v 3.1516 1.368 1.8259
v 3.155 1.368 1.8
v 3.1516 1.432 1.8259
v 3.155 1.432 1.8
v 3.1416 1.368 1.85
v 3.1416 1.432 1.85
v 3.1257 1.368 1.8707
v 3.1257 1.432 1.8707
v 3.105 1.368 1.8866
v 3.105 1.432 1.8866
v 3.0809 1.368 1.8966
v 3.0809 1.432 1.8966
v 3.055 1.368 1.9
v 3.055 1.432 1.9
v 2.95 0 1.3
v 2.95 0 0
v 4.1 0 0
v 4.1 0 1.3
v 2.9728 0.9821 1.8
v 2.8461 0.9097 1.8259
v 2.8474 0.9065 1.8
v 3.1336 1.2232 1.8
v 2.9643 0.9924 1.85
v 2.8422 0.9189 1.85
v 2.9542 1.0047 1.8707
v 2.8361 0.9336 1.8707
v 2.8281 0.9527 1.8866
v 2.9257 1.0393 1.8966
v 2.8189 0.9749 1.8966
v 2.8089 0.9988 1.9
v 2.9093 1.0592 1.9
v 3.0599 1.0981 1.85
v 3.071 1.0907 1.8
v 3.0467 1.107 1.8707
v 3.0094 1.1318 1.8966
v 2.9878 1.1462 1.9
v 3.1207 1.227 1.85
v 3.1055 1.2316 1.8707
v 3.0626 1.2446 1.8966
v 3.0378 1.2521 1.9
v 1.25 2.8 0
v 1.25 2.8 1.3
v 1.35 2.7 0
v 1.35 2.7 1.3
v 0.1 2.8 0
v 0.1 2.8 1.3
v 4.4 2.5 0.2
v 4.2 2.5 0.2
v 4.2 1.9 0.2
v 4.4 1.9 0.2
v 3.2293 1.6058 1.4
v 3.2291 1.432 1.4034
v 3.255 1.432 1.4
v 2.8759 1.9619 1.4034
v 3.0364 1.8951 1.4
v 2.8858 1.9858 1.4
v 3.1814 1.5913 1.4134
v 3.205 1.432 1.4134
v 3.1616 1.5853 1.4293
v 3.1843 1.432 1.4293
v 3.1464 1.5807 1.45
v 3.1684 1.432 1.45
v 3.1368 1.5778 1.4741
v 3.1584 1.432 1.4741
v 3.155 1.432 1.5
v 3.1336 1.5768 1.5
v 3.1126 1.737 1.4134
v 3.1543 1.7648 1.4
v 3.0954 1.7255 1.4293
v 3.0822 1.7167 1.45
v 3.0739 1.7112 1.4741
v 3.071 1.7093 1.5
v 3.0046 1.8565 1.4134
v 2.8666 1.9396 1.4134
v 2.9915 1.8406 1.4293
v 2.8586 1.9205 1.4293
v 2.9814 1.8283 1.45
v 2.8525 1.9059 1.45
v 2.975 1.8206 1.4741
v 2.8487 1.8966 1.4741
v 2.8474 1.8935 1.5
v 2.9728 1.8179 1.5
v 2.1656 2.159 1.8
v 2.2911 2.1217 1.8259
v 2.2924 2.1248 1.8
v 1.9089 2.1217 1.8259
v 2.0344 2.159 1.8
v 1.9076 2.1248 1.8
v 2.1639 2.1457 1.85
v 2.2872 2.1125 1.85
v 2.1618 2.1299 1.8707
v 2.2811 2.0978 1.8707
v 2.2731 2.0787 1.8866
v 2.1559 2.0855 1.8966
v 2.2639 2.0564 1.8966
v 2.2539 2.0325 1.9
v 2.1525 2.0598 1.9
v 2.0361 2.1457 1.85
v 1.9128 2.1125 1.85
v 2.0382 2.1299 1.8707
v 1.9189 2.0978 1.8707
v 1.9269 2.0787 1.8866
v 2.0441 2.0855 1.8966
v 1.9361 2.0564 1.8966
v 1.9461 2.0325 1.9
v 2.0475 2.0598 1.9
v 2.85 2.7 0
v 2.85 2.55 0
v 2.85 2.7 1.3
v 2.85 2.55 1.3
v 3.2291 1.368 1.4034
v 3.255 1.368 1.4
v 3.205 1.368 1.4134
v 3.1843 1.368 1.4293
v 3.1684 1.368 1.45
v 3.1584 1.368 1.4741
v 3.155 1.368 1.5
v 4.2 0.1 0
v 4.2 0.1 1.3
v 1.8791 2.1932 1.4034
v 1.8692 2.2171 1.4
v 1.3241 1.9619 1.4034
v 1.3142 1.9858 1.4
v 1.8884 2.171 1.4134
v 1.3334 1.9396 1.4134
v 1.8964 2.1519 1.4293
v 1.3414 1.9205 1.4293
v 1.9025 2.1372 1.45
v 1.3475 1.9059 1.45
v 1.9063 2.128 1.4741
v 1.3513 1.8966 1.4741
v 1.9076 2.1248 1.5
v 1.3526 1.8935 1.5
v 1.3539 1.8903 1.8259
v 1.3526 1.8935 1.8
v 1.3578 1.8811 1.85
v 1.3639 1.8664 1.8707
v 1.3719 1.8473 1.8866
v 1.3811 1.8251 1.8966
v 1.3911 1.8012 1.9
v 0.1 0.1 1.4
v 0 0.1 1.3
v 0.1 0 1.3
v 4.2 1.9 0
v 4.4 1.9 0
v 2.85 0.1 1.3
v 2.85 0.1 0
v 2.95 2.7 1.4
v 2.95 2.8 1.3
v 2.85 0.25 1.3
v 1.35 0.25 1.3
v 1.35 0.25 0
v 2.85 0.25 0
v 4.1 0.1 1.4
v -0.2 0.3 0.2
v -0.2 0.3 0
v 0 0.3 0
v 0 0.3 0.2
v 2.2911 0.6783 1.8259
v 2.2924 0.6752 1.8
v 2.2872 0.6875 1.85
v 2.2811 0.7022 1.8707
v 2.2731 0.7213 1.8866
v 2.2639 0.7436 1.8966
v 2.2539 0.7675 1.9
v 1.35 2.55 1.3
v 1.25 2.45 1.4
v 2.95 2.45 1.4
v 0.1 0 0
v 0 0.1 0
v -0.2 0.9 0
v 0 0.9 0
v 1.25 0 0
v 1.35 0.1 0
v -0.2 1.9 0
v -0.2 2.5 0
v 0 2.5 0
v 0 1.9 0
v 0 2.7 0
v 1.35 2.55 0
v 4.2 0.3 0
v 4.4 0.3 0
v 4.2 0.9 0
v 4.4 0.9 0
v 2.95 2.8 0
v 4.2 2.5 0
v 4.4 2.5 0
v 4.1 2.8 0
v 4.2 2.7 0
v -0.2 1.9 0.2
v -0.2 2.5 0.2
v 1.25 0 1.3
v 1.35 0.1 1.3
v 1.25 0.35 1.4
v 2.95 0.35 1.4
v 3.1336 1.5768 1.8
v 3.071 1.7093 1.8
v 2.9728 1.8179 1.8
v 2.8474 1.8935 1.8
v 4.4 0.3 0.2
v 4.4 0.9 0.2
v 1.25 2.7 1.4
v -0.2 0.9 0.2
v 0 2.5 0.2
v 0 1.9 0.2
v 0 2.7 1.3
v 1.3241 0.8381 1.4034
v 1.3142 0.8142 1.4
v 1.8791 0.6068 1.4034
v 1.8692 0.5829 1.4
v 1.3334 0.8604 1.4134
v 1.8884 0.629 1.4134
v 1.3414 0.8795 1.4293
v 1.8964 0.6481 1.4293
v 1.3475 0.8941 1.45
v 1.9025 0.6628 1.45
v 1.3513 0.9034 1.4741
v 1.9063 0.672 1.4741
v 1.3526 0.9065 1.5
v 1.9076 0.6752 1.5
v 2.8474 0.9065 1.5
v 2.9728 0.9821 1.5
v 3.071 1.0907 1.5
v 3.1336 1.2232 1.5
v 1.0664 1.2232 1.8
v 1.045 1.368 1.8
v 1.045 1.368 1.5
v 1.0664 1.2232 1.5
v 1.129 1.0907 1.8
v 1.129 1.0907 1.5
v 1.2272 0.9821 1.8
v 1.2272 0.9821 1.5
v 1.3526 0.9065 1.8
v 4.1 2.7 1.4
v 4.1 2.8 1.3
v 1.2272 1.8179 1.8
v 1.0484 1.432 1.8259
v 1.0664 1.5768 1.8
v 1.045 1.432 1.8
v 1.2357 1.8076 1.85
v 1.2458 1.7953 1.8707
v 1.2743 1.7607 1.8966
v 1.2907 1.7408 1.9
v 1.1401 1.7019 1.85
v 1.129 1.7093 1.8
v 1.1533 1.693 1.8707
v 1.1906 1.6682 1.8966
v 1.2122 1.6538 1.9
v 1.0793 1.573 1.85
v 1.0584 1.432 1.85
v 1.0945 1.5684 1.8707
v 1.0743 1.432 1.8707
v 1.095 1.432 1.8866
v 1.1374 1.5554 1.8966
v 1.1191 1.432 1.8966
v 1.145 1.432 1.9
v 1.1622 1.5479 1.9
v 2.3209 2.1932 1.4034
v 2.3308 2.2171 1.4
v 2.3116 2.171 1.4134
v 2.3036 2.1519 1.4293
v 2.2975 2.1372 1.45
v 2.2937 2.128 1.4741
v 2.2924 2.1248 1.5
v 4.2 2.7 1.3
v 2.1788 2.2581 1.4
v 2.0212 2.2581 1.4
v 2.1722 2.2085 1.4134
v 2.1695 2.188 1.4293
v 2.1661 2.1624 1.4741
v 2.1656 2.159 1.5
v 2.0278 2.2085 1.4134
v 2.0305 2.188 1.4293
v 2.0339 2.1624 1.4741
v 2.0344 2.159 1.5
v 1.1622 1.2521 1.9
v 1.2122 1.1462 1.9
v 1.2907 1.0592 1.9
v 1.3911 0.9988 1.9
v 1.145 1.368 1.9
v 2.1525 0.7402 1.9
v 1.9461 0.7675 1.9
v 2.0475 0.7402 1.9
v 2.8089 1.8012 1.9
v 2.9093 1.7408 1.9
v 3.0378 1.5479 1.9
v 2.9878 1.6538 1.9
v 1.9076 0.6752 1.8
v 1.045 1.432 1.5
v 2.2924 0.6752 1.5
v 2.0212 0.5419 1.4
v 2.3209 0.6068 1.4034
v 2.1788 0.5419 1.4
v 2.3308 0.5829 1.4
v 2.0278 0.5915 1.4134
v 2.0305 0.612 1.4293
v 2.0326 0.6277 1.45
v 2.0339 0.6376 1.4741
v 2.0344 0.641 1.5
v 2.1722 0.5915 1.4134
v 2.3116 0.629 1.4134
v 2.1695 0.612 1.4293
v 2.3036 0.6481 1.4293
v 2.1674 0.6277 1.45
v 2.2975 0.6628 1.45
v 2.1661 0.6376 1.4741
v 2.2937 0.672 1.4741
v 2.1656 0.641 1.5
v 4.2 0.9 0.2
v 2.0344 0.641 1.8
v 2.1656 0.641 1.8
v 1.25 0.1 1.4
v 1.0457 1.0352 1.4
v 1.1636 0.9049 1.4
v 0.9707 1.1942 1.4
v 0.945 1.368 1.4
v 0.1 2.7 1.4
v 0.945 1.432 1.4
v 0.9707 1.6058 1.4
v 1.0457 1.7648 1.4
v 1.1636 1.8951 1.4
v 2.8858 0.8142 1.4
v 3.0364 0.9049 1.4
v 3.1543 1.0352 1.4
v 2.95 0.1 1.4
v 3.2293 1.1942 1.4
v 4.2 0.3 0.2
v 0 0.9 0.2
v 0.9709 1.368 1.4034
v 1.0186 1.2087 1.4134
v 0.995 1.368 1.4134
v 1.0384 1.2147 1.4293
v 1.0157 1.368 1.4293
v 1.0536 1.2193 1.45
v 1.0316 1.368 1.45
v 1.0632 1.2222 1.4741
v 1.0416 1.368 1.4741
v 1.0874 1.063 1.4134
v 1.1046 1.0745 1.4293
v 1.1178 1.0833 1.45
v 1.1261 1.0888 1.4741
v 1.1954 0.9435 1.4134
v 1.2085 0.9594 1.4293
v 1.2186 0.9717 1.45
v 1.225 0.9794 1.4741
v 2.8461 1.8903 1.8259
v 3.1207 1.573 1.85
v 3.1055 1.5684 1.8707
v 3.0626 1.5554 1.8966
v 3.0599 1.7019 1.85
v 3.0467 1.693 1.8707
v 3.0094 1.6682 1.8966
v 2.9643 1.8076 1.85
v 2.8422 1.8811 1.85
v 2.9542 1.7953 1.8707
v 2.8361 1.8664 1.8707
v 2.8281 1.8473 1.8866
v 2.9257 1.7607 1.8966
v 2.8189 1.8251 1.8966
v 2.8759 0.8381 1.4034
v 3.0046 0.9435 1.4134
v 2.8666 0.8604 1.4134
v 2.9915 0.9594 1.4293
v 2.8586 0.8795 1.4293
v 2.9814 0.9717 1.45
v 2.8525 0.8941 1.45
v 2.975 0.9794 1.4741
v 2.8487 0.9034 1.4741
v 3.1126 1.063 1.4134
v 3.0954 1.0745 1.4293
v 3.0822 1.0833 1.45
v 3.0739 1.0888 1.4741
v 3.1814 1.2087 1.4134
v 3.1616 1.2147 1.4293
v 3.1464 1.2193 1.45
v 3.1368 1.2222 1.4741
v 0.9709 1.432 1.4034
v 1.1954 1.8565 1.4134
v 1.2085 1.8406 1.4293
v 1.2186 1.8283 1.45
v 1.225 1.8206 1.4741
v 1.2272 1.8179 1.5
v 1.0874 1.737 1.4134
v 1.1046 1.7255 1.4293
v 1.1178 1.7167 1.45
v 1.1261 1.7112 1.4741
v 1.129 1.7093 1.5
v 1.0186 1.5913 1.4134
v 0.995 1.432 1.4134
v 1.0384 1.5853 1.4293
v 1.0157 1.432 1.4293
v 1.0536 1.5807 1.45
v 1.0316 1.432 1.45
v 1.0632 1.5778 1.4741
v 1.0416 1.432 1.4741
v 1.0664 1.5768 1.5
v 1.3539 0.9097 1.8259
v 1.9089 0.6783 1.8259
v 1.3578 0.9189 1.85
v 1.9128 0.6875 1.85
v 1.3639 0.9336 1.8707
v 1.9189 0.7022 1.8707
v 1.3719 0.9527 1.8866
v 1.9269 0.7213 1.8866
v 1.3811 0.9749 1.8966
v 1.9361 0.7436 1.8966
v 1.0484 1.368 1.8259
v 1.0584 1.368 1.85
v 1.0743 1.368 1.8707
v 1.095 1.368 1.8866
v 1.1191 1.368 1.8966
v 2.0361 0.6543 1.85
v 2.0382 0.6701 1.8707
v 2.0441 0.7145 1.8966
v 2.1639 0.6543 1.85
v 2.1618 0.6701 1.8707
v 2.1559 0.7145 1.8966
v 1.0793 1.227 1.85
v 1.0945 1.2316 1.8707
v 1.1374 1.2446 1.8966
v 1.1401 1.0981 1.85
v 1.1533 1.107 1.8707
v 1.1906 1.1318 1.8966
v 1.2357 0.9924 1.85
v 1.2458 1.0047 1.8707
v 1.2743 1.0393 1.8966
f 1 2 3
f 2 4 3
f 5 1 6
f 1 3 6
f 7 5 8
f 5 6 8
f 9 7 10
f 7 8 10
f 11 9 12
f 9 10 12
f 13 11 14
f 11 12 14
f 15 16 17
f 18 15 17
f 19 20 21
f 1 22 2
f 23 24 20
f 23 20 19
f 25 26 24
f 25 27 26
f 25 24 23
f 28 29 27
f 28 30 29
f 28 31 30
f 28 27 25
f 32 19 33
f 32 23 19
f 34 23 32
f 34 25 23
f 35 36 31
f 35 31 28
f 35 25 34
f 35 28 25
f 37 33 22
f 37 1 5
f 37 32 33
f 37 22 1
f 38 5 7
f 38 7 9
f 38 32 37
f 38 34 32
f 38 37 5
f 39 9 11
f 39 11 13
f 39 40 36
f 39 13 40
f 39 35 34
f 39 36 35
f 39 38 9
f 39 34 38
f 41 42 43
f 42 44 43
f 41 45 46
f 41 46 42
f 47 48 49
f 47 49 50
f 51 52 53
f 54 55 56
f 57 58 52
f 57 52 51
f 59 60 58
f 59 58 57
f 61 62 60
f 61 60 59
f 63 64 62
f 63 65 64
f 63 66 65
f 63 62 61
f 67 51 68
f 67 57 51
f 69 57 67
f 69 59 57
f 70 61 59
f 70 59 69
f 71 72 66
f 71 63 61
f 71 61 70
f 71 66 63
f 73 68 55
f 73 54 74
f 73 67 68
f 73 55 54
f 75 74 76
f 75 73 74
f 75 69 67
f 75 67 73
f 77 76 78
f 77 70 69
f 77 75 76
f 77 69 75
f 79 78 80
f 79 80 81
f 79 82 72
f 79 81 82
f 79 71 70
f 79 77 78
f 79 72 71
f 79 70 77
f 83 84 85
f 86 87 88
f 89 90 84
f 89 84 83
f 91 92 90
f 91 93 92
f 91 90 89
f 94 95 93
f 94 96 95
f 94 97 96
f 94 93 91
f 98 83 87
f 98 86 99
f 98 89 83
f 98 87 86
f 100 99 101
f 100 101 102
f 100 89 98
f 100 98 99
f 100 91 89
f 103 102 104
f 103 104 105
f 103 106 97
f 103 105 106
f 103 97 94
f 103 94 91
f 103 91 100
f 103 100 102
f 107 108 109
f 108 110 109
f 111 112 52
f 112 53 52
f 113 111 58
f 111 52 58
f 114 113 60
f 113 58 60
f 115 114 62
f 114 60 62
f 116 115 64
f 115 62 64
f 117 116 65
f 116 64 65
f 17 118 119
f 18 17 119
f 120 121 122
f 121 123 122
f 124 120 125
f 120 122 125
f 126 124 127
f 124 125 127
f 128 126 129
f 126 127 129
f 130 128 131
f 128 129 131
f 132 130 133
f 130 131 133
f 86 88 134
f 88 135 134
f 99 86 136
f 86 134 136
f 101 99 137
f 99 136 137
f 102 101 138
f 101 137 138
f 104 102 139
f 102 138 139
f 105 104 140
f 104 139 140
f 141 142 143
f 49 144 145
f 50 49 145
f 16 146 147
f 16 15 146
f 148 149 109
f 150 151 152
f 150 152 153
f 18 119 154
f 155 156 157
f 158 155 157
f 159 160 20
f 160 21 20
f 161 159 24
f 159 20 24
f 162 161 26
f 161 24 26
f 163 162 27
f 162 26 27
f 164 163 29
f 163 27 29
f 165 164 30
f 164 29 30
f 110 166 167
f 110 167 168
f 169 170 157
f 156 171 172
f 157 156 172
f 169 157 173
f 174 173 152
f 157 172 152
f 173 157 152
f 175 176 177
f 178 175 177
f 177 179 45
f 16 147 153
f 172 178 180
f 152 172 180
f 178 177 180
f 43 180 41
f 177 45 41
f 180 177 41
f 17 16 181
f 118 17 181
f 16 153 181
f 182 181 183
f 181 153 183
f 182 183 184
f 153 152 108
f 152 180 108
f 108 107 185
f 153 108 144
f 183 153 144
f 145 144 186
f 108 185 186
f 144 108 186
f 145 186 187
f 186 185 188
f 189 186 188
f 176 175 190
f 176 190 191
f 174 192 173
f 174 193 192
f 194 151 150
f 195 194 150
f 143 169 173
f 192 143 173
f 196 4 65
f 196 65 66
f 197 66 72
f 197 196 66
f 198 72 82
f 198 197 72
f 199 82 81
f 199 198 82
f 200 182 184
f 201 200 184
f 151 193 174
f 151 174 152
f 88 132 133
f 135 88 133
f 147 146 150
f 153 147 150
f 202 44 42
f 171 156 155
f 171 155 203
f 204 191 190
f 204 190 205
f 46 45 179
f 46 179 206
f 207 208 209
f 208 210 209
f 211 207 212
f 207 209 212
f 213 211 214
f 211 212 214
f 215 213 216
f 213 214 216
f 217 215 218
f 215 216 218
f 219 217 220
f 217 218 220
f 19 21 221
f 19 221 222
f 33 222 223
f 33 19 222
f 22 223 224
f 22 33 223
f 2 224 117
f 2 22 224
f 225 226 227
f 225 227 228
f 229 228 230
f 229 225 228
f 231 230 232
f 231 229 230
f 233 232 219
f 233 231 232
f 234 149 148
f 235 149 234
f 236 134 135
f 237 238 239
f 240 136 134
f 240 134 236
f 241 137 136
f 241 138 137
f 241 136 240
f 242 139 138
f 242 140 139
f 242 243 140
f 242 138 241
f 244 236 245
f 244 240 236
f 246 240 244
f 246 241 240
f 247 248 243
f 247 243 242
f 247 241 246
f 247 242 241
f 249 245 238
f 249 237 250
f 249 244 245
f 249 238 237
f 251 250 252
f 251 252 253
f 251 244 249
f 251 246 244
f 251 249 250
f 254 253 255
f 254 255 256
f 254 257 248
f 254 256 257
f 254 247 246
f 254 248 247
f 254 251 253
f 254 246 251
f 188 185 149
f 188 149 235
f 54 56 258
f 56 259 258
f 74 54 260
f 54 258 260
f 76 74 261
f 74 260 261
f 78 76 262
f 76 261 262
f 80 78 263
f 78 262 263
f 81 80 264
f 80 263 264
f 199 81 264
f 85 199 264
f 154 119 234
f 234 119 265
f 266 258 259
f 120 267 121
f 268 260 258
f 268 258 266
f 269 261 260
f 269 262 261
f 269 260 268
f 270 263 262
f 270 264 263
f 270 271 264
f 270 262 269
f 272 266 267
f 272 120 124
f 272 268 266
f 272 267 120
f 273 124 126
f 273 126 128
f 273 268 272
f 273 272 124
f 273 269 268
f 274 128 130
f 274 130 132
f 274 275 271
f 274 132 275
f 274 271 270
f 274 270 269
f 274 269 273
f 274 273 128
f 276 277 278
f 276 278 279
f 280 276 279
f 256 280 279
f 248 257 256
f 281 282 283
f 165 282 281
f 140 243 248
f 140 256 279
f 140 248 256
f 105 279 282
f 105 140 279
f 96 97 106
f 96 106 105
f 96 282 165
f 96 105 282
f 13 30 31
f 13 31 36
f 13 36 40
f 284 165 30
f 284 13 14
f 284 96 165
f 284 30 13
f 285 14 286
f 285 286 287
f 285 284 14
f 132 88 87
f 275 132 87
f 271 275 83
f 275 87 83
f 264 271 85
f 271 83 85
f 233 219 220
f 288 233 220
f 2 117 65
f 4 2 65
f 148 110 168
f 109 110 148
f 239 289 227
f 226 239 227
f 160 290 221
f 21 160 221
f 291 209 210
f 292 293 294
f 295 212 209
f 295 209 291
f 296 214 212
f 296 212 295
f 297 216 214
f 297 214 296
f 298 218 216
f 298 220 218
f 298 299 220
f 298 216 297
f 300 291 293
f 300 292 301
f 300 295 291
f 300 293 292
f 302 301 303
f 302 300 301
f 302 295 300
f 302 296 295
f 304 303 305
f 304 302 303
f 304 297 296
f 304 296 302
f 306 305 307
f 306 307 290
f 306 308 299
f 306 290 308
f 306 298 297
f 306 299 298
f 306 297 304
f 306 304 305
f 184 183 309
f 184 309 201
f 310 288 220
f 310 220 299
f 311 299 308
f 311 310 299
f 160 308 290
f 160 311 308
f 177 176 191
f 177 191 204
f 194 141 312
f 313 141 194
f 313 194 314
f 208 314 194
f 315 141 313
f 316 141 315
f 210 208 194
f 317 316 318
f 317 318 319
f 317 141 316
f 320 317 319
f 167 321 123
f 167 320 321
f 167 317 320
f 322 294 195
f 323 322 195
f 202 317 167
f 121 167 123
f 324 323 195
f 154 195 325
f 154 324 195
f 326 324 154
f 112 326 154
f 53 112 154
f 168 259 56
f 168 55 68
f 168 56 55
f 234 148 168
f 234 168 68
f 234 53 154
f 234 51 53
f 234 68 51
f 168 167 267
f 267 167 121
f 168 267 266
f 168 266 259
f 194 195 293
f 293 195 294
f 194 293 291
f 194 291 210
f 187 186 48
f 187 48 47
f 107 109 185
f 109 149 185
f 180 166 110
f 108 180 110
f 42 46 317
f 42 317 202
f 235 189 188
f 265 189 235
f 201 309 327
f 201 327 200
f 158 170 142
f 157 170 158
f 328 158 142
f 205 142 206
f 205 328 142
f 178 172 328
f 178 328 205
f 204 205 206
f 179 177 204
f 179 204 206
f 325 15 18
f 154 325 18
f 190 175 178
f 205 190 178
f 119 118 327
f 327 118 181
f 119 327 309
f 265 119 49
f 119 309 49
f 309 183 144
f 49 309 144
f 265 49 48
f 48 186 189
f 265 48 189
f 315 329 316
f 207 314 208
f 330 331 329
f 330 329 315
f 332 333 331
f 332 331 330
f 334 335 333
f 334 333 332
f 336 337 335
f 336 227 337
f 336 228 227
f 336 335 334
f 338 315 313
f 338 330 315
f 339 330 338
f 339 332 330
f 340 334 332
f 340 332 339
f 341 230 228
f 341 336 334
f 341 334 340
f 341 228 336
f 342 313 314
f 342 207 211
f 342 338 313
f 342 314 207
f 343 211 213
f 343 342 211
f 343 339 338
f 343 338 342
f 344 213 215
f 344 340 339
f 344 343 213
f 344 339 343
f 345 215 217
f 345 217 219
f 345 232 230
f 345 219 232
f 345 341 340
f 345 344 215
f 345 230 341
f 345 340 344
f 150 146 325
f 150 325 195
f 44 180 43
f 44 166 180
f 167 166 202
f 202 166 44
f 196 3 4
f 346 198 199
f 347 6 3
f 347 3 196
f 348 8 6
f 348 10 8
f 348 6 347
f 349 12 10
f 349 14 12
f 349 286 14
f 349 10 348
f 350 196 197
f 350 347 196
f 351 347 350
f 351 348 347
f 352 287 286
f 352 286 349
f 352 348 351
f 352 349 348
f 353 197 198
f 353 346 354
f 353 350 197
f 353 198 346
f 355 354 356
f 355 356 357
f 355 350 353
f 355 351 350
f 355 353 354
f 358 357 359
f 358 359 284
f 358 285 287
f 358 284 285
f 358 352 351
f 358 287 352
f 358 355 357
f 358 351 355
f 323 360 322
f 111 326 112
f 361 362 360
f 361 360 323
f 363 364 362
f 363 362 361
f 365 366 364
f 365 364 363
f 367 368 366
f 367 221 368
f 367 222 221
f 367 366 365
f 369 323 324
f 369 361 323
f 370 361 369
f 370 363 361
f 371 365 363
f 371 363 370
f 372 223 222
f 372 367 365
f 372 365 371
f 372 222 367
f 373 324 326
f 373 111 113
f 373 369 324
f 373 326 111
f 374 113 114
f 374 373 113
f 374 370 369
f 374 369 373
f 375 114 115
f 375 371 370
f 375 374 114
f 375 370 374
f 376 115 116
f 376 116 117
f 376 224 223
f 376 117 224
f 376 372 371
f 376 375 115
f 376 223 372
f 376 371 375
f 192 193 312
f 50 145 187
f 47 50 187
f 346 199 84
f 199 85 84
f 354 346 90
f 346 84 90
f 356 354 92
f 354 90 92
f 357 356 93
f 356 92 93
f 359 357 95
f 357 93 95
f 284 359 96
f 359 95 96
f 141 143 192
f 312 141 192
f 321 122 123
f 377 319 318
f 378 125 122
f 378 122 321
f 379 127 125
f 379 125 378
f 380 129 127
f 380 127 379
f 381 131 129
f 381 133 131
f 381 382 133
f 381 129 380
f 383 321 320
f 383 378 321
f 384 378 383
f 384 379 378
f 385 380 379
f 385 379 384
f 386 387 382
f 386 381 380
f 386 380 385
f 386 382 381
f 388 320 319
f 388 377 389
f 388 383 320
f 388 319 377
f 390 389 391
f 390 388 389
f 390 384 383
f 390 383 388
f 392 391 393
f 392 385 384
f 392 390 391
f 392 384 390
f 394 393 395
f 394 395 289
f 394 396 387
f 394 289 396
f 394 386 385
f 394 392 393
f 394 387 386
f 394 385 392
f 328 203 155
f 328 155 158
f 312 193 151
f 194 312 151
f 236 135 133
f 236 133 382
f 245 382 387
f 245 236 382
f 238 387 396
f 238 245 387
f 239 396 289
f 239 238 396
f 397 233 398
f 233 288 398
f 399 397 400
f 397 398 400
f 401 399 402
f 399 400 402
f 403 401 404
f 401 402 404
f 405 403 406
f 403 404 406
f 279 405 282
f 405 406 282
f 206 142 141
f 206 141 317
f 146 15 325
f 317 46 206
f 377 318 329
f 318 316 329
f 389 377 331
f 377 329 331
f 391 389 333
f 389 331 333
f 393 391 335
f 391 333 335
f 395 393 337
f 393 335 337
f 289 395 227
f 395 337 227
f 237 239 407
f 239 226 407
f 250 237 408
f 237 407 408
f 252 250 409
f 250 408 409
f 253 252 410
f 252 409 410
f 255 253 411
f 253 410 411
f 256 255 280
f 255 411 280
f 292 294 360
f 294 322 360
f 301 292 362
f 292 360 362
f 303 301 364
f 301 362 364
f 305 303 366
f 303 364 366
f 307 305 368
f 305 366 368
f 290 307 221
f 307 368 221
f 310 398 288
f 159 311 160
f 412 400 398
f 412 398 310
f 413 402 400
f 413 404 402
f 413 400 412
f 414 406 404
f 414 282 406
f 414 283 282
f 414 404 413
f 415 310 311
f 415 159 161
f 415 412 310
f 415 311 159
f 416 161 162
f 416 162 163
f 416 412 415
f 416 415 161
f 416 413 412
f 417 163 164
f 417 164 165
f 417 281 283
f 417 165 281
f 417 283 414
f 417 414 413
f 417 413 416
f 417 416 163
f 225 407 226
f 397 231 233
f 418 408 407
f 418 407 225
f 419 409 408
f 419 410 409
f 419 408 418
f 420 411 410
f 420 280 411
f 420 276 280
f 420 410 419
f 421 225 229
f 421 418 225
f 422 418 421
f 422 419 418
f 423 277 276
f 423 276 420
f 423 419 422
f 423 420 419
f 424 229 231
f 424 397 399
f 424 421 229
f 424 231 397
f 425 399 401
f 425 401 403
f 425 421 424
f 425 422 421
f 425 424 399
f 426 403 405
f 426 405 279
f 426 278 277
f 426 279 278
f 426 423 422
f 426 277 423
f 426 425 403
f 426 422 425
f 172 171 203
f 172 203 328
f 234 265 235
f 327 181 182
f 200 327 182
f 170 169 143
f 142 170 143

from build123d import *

# Parameters (mm, degrees)
SKETCH1_W           = 4.2
SKETCH1_H           = 2.8
BOSS_EXTRUDE1_DEPTH = 1.4
SKETCH2_W           = 0.2
SKETCH2_H           = 0.6
BOSS_EXTRUDE2_DEPTH = 0.2
SKETCH3_W           = 1.5
SKETCH3_H           = 0.25
CUT_EXTRUDE1_DEPTH  = 2.4
BOSS_EXTRUDE3_DEPTH = 0.5
FILLET1_R           = 0.5
FILLET2_R           = 0.1
CHAMFER1_SIZE       = 0.1


with BuildPart() as part:
    # Sketch1 → Boss-Extrude1 (new body)
    with BuildSketch(Plane.XY):
        with Locations((2.1, 1.4)):
            Rectangle(SKETCH1_W, SKETCH1_H)
    extrude(amount=BOSS_EXTRUDE1_DEPTH)

    # Sketch2 → Boss-Extrude2 (add)
    with BuildSketch(Plane.XY):
        with Locations((4.3, 2.2)):
            Rectangle(SKETCH2_W, SKETCH2_H)
        with Locations((4.3, 0.6)):
            Rectangle(SKETCH2_W, SKETCH2_H)
        with Locations((-0.1, 2.2)):
            Rectangle(SKETCH2_W, SKETCH2_H)
        with Locations((-0.1, 0.6)):
            Rectangle(SKETCH2_W, SKETCH2_H)
    extrude(amount=BOSS_EXTRUDE2_DEPTH)

    # Sketch3 → Cut-Extrude1 (cut, through all)
    with BuildSketch(Plane.XY.offset(1.4)):
        with Locations((2.1, 2.675)):
            Rectangle(SKETCH3_W, SKETCH3_H)
        with Locations((2.1, 0.125)):
            Rectangle(SKETCH3_W, SKETCH3_H)
    extrude(amount=-CUT_EXTRUDE1_DEPTH, mode=Mode.SUBTRACT)

    # Sketch4 → Boss-Extrude3 (add)
    with BuildSketch(Plane.XY.offset(1.4)):
        Polygon((2.1, 2.205), (1.045, 1.765257339), (1.045, 1.034742661), (2.1, 0.595), (3.155, 1.034742661), (3.155, 1.765257339), align=None)
    extrude(amount=BOSS_EXTRUDE3_DEPTH)

    # Fillet1
    fillet1_edges = [part.edges().sort_by_distance(p)[0] for p in [
        (3.155, 1.765257339, 1.65),
        (2.1, 2.205, 1.65),
        (1.045, 1.765257339, 1.65),
        (1.045, 1.034742661, 1.65),
        (2.1, 0.595, 1.65),
        (3.155, 1.034742661, 1.65),
    ]]
    fillet(fillet1_edges, radius=FILLET1_R)

    # Fillet2
    fillet2_edges = [part.edges().sort_by_distance(p)[0] for p in [
        (1.630132921, 2.00915109, 1.4),
        (1.630132921, 2.00915109, 1.9),
        (2.569867079, 2.00915109, 1.4),
        (2.569867079, 2.00915109, 1.9),
        (1.045, 1.4, 1.9),
        (1.630132921, 0.79084891, 1.9),
        (2.569867079, 0.79084891, 1.9),
        (3.155, 1.4, 1.9),
        (2.1, 0.636695714, 1.9),
        (1.12895701, 1.090706199, 1.9),
        (3.07104299, 1.090706199, 1.9),
        (3.07104299, 1.709293801, 1.9),
        (1.12895701, 1.709293801, 1.9),
        (2.1, 2.163304286, 1.9),
        (1.045, 1.4, 1.4),
        (3.155, 1.4, 1.4),
        (2.569867079, 0.79084891, 1.4),
        (1.630132921, 0.79084891, 1.4),
        (2.1, 2.163304286, 1.4),
        (1.12895701, 1.709293801, 1.4),
        (3.07104299, 1.709293801, 1.4),
        (3.07104299, 1.090706199, 1.4),
        (1.12895701, 1.090706199, 1.4),
        (2.1, 0.636695714, 1.4),
    ]]
    fillet(fillet2_edges, radius=FILLET2_R)

    # Chamfer1
    chamfer1_edges = [part.edges().sort_by_distance(p)[0] for p in [
        (4.2, 2.8, 0.7),
        (2.85, 2.8, 0.7),
        (1.35, 2.8, 0.7),
        (0, 2.8, 0.7),
        (0, 0, 0.7),
        (1.35, 0, 0.7),
        (2.85, 0, 0.7),
        (4.2, 0, 0.7),
        (4.2, 1.4, 1.4),
        (3.525, 2.8, 1.4),
        (2.85, 2.675, 1.4),
        (2.1, 2.55, 1.4),
        (1.35, 2.675, 1.4),
        (0.675, 2.8, 1.4),
        (0, 1.4, 1.4),
        (3.525, 0, 1.4),
        (2.85, 0.125, 1.4),
        (2.1, 0.25, 1.4),
        (1.35, 0.125, 1.4),
        (0.675, 0, 1.4),
    ]]
    chamfer(chamfer1_edges, length=CHAMFER1_SIZE)


solid = part.part
